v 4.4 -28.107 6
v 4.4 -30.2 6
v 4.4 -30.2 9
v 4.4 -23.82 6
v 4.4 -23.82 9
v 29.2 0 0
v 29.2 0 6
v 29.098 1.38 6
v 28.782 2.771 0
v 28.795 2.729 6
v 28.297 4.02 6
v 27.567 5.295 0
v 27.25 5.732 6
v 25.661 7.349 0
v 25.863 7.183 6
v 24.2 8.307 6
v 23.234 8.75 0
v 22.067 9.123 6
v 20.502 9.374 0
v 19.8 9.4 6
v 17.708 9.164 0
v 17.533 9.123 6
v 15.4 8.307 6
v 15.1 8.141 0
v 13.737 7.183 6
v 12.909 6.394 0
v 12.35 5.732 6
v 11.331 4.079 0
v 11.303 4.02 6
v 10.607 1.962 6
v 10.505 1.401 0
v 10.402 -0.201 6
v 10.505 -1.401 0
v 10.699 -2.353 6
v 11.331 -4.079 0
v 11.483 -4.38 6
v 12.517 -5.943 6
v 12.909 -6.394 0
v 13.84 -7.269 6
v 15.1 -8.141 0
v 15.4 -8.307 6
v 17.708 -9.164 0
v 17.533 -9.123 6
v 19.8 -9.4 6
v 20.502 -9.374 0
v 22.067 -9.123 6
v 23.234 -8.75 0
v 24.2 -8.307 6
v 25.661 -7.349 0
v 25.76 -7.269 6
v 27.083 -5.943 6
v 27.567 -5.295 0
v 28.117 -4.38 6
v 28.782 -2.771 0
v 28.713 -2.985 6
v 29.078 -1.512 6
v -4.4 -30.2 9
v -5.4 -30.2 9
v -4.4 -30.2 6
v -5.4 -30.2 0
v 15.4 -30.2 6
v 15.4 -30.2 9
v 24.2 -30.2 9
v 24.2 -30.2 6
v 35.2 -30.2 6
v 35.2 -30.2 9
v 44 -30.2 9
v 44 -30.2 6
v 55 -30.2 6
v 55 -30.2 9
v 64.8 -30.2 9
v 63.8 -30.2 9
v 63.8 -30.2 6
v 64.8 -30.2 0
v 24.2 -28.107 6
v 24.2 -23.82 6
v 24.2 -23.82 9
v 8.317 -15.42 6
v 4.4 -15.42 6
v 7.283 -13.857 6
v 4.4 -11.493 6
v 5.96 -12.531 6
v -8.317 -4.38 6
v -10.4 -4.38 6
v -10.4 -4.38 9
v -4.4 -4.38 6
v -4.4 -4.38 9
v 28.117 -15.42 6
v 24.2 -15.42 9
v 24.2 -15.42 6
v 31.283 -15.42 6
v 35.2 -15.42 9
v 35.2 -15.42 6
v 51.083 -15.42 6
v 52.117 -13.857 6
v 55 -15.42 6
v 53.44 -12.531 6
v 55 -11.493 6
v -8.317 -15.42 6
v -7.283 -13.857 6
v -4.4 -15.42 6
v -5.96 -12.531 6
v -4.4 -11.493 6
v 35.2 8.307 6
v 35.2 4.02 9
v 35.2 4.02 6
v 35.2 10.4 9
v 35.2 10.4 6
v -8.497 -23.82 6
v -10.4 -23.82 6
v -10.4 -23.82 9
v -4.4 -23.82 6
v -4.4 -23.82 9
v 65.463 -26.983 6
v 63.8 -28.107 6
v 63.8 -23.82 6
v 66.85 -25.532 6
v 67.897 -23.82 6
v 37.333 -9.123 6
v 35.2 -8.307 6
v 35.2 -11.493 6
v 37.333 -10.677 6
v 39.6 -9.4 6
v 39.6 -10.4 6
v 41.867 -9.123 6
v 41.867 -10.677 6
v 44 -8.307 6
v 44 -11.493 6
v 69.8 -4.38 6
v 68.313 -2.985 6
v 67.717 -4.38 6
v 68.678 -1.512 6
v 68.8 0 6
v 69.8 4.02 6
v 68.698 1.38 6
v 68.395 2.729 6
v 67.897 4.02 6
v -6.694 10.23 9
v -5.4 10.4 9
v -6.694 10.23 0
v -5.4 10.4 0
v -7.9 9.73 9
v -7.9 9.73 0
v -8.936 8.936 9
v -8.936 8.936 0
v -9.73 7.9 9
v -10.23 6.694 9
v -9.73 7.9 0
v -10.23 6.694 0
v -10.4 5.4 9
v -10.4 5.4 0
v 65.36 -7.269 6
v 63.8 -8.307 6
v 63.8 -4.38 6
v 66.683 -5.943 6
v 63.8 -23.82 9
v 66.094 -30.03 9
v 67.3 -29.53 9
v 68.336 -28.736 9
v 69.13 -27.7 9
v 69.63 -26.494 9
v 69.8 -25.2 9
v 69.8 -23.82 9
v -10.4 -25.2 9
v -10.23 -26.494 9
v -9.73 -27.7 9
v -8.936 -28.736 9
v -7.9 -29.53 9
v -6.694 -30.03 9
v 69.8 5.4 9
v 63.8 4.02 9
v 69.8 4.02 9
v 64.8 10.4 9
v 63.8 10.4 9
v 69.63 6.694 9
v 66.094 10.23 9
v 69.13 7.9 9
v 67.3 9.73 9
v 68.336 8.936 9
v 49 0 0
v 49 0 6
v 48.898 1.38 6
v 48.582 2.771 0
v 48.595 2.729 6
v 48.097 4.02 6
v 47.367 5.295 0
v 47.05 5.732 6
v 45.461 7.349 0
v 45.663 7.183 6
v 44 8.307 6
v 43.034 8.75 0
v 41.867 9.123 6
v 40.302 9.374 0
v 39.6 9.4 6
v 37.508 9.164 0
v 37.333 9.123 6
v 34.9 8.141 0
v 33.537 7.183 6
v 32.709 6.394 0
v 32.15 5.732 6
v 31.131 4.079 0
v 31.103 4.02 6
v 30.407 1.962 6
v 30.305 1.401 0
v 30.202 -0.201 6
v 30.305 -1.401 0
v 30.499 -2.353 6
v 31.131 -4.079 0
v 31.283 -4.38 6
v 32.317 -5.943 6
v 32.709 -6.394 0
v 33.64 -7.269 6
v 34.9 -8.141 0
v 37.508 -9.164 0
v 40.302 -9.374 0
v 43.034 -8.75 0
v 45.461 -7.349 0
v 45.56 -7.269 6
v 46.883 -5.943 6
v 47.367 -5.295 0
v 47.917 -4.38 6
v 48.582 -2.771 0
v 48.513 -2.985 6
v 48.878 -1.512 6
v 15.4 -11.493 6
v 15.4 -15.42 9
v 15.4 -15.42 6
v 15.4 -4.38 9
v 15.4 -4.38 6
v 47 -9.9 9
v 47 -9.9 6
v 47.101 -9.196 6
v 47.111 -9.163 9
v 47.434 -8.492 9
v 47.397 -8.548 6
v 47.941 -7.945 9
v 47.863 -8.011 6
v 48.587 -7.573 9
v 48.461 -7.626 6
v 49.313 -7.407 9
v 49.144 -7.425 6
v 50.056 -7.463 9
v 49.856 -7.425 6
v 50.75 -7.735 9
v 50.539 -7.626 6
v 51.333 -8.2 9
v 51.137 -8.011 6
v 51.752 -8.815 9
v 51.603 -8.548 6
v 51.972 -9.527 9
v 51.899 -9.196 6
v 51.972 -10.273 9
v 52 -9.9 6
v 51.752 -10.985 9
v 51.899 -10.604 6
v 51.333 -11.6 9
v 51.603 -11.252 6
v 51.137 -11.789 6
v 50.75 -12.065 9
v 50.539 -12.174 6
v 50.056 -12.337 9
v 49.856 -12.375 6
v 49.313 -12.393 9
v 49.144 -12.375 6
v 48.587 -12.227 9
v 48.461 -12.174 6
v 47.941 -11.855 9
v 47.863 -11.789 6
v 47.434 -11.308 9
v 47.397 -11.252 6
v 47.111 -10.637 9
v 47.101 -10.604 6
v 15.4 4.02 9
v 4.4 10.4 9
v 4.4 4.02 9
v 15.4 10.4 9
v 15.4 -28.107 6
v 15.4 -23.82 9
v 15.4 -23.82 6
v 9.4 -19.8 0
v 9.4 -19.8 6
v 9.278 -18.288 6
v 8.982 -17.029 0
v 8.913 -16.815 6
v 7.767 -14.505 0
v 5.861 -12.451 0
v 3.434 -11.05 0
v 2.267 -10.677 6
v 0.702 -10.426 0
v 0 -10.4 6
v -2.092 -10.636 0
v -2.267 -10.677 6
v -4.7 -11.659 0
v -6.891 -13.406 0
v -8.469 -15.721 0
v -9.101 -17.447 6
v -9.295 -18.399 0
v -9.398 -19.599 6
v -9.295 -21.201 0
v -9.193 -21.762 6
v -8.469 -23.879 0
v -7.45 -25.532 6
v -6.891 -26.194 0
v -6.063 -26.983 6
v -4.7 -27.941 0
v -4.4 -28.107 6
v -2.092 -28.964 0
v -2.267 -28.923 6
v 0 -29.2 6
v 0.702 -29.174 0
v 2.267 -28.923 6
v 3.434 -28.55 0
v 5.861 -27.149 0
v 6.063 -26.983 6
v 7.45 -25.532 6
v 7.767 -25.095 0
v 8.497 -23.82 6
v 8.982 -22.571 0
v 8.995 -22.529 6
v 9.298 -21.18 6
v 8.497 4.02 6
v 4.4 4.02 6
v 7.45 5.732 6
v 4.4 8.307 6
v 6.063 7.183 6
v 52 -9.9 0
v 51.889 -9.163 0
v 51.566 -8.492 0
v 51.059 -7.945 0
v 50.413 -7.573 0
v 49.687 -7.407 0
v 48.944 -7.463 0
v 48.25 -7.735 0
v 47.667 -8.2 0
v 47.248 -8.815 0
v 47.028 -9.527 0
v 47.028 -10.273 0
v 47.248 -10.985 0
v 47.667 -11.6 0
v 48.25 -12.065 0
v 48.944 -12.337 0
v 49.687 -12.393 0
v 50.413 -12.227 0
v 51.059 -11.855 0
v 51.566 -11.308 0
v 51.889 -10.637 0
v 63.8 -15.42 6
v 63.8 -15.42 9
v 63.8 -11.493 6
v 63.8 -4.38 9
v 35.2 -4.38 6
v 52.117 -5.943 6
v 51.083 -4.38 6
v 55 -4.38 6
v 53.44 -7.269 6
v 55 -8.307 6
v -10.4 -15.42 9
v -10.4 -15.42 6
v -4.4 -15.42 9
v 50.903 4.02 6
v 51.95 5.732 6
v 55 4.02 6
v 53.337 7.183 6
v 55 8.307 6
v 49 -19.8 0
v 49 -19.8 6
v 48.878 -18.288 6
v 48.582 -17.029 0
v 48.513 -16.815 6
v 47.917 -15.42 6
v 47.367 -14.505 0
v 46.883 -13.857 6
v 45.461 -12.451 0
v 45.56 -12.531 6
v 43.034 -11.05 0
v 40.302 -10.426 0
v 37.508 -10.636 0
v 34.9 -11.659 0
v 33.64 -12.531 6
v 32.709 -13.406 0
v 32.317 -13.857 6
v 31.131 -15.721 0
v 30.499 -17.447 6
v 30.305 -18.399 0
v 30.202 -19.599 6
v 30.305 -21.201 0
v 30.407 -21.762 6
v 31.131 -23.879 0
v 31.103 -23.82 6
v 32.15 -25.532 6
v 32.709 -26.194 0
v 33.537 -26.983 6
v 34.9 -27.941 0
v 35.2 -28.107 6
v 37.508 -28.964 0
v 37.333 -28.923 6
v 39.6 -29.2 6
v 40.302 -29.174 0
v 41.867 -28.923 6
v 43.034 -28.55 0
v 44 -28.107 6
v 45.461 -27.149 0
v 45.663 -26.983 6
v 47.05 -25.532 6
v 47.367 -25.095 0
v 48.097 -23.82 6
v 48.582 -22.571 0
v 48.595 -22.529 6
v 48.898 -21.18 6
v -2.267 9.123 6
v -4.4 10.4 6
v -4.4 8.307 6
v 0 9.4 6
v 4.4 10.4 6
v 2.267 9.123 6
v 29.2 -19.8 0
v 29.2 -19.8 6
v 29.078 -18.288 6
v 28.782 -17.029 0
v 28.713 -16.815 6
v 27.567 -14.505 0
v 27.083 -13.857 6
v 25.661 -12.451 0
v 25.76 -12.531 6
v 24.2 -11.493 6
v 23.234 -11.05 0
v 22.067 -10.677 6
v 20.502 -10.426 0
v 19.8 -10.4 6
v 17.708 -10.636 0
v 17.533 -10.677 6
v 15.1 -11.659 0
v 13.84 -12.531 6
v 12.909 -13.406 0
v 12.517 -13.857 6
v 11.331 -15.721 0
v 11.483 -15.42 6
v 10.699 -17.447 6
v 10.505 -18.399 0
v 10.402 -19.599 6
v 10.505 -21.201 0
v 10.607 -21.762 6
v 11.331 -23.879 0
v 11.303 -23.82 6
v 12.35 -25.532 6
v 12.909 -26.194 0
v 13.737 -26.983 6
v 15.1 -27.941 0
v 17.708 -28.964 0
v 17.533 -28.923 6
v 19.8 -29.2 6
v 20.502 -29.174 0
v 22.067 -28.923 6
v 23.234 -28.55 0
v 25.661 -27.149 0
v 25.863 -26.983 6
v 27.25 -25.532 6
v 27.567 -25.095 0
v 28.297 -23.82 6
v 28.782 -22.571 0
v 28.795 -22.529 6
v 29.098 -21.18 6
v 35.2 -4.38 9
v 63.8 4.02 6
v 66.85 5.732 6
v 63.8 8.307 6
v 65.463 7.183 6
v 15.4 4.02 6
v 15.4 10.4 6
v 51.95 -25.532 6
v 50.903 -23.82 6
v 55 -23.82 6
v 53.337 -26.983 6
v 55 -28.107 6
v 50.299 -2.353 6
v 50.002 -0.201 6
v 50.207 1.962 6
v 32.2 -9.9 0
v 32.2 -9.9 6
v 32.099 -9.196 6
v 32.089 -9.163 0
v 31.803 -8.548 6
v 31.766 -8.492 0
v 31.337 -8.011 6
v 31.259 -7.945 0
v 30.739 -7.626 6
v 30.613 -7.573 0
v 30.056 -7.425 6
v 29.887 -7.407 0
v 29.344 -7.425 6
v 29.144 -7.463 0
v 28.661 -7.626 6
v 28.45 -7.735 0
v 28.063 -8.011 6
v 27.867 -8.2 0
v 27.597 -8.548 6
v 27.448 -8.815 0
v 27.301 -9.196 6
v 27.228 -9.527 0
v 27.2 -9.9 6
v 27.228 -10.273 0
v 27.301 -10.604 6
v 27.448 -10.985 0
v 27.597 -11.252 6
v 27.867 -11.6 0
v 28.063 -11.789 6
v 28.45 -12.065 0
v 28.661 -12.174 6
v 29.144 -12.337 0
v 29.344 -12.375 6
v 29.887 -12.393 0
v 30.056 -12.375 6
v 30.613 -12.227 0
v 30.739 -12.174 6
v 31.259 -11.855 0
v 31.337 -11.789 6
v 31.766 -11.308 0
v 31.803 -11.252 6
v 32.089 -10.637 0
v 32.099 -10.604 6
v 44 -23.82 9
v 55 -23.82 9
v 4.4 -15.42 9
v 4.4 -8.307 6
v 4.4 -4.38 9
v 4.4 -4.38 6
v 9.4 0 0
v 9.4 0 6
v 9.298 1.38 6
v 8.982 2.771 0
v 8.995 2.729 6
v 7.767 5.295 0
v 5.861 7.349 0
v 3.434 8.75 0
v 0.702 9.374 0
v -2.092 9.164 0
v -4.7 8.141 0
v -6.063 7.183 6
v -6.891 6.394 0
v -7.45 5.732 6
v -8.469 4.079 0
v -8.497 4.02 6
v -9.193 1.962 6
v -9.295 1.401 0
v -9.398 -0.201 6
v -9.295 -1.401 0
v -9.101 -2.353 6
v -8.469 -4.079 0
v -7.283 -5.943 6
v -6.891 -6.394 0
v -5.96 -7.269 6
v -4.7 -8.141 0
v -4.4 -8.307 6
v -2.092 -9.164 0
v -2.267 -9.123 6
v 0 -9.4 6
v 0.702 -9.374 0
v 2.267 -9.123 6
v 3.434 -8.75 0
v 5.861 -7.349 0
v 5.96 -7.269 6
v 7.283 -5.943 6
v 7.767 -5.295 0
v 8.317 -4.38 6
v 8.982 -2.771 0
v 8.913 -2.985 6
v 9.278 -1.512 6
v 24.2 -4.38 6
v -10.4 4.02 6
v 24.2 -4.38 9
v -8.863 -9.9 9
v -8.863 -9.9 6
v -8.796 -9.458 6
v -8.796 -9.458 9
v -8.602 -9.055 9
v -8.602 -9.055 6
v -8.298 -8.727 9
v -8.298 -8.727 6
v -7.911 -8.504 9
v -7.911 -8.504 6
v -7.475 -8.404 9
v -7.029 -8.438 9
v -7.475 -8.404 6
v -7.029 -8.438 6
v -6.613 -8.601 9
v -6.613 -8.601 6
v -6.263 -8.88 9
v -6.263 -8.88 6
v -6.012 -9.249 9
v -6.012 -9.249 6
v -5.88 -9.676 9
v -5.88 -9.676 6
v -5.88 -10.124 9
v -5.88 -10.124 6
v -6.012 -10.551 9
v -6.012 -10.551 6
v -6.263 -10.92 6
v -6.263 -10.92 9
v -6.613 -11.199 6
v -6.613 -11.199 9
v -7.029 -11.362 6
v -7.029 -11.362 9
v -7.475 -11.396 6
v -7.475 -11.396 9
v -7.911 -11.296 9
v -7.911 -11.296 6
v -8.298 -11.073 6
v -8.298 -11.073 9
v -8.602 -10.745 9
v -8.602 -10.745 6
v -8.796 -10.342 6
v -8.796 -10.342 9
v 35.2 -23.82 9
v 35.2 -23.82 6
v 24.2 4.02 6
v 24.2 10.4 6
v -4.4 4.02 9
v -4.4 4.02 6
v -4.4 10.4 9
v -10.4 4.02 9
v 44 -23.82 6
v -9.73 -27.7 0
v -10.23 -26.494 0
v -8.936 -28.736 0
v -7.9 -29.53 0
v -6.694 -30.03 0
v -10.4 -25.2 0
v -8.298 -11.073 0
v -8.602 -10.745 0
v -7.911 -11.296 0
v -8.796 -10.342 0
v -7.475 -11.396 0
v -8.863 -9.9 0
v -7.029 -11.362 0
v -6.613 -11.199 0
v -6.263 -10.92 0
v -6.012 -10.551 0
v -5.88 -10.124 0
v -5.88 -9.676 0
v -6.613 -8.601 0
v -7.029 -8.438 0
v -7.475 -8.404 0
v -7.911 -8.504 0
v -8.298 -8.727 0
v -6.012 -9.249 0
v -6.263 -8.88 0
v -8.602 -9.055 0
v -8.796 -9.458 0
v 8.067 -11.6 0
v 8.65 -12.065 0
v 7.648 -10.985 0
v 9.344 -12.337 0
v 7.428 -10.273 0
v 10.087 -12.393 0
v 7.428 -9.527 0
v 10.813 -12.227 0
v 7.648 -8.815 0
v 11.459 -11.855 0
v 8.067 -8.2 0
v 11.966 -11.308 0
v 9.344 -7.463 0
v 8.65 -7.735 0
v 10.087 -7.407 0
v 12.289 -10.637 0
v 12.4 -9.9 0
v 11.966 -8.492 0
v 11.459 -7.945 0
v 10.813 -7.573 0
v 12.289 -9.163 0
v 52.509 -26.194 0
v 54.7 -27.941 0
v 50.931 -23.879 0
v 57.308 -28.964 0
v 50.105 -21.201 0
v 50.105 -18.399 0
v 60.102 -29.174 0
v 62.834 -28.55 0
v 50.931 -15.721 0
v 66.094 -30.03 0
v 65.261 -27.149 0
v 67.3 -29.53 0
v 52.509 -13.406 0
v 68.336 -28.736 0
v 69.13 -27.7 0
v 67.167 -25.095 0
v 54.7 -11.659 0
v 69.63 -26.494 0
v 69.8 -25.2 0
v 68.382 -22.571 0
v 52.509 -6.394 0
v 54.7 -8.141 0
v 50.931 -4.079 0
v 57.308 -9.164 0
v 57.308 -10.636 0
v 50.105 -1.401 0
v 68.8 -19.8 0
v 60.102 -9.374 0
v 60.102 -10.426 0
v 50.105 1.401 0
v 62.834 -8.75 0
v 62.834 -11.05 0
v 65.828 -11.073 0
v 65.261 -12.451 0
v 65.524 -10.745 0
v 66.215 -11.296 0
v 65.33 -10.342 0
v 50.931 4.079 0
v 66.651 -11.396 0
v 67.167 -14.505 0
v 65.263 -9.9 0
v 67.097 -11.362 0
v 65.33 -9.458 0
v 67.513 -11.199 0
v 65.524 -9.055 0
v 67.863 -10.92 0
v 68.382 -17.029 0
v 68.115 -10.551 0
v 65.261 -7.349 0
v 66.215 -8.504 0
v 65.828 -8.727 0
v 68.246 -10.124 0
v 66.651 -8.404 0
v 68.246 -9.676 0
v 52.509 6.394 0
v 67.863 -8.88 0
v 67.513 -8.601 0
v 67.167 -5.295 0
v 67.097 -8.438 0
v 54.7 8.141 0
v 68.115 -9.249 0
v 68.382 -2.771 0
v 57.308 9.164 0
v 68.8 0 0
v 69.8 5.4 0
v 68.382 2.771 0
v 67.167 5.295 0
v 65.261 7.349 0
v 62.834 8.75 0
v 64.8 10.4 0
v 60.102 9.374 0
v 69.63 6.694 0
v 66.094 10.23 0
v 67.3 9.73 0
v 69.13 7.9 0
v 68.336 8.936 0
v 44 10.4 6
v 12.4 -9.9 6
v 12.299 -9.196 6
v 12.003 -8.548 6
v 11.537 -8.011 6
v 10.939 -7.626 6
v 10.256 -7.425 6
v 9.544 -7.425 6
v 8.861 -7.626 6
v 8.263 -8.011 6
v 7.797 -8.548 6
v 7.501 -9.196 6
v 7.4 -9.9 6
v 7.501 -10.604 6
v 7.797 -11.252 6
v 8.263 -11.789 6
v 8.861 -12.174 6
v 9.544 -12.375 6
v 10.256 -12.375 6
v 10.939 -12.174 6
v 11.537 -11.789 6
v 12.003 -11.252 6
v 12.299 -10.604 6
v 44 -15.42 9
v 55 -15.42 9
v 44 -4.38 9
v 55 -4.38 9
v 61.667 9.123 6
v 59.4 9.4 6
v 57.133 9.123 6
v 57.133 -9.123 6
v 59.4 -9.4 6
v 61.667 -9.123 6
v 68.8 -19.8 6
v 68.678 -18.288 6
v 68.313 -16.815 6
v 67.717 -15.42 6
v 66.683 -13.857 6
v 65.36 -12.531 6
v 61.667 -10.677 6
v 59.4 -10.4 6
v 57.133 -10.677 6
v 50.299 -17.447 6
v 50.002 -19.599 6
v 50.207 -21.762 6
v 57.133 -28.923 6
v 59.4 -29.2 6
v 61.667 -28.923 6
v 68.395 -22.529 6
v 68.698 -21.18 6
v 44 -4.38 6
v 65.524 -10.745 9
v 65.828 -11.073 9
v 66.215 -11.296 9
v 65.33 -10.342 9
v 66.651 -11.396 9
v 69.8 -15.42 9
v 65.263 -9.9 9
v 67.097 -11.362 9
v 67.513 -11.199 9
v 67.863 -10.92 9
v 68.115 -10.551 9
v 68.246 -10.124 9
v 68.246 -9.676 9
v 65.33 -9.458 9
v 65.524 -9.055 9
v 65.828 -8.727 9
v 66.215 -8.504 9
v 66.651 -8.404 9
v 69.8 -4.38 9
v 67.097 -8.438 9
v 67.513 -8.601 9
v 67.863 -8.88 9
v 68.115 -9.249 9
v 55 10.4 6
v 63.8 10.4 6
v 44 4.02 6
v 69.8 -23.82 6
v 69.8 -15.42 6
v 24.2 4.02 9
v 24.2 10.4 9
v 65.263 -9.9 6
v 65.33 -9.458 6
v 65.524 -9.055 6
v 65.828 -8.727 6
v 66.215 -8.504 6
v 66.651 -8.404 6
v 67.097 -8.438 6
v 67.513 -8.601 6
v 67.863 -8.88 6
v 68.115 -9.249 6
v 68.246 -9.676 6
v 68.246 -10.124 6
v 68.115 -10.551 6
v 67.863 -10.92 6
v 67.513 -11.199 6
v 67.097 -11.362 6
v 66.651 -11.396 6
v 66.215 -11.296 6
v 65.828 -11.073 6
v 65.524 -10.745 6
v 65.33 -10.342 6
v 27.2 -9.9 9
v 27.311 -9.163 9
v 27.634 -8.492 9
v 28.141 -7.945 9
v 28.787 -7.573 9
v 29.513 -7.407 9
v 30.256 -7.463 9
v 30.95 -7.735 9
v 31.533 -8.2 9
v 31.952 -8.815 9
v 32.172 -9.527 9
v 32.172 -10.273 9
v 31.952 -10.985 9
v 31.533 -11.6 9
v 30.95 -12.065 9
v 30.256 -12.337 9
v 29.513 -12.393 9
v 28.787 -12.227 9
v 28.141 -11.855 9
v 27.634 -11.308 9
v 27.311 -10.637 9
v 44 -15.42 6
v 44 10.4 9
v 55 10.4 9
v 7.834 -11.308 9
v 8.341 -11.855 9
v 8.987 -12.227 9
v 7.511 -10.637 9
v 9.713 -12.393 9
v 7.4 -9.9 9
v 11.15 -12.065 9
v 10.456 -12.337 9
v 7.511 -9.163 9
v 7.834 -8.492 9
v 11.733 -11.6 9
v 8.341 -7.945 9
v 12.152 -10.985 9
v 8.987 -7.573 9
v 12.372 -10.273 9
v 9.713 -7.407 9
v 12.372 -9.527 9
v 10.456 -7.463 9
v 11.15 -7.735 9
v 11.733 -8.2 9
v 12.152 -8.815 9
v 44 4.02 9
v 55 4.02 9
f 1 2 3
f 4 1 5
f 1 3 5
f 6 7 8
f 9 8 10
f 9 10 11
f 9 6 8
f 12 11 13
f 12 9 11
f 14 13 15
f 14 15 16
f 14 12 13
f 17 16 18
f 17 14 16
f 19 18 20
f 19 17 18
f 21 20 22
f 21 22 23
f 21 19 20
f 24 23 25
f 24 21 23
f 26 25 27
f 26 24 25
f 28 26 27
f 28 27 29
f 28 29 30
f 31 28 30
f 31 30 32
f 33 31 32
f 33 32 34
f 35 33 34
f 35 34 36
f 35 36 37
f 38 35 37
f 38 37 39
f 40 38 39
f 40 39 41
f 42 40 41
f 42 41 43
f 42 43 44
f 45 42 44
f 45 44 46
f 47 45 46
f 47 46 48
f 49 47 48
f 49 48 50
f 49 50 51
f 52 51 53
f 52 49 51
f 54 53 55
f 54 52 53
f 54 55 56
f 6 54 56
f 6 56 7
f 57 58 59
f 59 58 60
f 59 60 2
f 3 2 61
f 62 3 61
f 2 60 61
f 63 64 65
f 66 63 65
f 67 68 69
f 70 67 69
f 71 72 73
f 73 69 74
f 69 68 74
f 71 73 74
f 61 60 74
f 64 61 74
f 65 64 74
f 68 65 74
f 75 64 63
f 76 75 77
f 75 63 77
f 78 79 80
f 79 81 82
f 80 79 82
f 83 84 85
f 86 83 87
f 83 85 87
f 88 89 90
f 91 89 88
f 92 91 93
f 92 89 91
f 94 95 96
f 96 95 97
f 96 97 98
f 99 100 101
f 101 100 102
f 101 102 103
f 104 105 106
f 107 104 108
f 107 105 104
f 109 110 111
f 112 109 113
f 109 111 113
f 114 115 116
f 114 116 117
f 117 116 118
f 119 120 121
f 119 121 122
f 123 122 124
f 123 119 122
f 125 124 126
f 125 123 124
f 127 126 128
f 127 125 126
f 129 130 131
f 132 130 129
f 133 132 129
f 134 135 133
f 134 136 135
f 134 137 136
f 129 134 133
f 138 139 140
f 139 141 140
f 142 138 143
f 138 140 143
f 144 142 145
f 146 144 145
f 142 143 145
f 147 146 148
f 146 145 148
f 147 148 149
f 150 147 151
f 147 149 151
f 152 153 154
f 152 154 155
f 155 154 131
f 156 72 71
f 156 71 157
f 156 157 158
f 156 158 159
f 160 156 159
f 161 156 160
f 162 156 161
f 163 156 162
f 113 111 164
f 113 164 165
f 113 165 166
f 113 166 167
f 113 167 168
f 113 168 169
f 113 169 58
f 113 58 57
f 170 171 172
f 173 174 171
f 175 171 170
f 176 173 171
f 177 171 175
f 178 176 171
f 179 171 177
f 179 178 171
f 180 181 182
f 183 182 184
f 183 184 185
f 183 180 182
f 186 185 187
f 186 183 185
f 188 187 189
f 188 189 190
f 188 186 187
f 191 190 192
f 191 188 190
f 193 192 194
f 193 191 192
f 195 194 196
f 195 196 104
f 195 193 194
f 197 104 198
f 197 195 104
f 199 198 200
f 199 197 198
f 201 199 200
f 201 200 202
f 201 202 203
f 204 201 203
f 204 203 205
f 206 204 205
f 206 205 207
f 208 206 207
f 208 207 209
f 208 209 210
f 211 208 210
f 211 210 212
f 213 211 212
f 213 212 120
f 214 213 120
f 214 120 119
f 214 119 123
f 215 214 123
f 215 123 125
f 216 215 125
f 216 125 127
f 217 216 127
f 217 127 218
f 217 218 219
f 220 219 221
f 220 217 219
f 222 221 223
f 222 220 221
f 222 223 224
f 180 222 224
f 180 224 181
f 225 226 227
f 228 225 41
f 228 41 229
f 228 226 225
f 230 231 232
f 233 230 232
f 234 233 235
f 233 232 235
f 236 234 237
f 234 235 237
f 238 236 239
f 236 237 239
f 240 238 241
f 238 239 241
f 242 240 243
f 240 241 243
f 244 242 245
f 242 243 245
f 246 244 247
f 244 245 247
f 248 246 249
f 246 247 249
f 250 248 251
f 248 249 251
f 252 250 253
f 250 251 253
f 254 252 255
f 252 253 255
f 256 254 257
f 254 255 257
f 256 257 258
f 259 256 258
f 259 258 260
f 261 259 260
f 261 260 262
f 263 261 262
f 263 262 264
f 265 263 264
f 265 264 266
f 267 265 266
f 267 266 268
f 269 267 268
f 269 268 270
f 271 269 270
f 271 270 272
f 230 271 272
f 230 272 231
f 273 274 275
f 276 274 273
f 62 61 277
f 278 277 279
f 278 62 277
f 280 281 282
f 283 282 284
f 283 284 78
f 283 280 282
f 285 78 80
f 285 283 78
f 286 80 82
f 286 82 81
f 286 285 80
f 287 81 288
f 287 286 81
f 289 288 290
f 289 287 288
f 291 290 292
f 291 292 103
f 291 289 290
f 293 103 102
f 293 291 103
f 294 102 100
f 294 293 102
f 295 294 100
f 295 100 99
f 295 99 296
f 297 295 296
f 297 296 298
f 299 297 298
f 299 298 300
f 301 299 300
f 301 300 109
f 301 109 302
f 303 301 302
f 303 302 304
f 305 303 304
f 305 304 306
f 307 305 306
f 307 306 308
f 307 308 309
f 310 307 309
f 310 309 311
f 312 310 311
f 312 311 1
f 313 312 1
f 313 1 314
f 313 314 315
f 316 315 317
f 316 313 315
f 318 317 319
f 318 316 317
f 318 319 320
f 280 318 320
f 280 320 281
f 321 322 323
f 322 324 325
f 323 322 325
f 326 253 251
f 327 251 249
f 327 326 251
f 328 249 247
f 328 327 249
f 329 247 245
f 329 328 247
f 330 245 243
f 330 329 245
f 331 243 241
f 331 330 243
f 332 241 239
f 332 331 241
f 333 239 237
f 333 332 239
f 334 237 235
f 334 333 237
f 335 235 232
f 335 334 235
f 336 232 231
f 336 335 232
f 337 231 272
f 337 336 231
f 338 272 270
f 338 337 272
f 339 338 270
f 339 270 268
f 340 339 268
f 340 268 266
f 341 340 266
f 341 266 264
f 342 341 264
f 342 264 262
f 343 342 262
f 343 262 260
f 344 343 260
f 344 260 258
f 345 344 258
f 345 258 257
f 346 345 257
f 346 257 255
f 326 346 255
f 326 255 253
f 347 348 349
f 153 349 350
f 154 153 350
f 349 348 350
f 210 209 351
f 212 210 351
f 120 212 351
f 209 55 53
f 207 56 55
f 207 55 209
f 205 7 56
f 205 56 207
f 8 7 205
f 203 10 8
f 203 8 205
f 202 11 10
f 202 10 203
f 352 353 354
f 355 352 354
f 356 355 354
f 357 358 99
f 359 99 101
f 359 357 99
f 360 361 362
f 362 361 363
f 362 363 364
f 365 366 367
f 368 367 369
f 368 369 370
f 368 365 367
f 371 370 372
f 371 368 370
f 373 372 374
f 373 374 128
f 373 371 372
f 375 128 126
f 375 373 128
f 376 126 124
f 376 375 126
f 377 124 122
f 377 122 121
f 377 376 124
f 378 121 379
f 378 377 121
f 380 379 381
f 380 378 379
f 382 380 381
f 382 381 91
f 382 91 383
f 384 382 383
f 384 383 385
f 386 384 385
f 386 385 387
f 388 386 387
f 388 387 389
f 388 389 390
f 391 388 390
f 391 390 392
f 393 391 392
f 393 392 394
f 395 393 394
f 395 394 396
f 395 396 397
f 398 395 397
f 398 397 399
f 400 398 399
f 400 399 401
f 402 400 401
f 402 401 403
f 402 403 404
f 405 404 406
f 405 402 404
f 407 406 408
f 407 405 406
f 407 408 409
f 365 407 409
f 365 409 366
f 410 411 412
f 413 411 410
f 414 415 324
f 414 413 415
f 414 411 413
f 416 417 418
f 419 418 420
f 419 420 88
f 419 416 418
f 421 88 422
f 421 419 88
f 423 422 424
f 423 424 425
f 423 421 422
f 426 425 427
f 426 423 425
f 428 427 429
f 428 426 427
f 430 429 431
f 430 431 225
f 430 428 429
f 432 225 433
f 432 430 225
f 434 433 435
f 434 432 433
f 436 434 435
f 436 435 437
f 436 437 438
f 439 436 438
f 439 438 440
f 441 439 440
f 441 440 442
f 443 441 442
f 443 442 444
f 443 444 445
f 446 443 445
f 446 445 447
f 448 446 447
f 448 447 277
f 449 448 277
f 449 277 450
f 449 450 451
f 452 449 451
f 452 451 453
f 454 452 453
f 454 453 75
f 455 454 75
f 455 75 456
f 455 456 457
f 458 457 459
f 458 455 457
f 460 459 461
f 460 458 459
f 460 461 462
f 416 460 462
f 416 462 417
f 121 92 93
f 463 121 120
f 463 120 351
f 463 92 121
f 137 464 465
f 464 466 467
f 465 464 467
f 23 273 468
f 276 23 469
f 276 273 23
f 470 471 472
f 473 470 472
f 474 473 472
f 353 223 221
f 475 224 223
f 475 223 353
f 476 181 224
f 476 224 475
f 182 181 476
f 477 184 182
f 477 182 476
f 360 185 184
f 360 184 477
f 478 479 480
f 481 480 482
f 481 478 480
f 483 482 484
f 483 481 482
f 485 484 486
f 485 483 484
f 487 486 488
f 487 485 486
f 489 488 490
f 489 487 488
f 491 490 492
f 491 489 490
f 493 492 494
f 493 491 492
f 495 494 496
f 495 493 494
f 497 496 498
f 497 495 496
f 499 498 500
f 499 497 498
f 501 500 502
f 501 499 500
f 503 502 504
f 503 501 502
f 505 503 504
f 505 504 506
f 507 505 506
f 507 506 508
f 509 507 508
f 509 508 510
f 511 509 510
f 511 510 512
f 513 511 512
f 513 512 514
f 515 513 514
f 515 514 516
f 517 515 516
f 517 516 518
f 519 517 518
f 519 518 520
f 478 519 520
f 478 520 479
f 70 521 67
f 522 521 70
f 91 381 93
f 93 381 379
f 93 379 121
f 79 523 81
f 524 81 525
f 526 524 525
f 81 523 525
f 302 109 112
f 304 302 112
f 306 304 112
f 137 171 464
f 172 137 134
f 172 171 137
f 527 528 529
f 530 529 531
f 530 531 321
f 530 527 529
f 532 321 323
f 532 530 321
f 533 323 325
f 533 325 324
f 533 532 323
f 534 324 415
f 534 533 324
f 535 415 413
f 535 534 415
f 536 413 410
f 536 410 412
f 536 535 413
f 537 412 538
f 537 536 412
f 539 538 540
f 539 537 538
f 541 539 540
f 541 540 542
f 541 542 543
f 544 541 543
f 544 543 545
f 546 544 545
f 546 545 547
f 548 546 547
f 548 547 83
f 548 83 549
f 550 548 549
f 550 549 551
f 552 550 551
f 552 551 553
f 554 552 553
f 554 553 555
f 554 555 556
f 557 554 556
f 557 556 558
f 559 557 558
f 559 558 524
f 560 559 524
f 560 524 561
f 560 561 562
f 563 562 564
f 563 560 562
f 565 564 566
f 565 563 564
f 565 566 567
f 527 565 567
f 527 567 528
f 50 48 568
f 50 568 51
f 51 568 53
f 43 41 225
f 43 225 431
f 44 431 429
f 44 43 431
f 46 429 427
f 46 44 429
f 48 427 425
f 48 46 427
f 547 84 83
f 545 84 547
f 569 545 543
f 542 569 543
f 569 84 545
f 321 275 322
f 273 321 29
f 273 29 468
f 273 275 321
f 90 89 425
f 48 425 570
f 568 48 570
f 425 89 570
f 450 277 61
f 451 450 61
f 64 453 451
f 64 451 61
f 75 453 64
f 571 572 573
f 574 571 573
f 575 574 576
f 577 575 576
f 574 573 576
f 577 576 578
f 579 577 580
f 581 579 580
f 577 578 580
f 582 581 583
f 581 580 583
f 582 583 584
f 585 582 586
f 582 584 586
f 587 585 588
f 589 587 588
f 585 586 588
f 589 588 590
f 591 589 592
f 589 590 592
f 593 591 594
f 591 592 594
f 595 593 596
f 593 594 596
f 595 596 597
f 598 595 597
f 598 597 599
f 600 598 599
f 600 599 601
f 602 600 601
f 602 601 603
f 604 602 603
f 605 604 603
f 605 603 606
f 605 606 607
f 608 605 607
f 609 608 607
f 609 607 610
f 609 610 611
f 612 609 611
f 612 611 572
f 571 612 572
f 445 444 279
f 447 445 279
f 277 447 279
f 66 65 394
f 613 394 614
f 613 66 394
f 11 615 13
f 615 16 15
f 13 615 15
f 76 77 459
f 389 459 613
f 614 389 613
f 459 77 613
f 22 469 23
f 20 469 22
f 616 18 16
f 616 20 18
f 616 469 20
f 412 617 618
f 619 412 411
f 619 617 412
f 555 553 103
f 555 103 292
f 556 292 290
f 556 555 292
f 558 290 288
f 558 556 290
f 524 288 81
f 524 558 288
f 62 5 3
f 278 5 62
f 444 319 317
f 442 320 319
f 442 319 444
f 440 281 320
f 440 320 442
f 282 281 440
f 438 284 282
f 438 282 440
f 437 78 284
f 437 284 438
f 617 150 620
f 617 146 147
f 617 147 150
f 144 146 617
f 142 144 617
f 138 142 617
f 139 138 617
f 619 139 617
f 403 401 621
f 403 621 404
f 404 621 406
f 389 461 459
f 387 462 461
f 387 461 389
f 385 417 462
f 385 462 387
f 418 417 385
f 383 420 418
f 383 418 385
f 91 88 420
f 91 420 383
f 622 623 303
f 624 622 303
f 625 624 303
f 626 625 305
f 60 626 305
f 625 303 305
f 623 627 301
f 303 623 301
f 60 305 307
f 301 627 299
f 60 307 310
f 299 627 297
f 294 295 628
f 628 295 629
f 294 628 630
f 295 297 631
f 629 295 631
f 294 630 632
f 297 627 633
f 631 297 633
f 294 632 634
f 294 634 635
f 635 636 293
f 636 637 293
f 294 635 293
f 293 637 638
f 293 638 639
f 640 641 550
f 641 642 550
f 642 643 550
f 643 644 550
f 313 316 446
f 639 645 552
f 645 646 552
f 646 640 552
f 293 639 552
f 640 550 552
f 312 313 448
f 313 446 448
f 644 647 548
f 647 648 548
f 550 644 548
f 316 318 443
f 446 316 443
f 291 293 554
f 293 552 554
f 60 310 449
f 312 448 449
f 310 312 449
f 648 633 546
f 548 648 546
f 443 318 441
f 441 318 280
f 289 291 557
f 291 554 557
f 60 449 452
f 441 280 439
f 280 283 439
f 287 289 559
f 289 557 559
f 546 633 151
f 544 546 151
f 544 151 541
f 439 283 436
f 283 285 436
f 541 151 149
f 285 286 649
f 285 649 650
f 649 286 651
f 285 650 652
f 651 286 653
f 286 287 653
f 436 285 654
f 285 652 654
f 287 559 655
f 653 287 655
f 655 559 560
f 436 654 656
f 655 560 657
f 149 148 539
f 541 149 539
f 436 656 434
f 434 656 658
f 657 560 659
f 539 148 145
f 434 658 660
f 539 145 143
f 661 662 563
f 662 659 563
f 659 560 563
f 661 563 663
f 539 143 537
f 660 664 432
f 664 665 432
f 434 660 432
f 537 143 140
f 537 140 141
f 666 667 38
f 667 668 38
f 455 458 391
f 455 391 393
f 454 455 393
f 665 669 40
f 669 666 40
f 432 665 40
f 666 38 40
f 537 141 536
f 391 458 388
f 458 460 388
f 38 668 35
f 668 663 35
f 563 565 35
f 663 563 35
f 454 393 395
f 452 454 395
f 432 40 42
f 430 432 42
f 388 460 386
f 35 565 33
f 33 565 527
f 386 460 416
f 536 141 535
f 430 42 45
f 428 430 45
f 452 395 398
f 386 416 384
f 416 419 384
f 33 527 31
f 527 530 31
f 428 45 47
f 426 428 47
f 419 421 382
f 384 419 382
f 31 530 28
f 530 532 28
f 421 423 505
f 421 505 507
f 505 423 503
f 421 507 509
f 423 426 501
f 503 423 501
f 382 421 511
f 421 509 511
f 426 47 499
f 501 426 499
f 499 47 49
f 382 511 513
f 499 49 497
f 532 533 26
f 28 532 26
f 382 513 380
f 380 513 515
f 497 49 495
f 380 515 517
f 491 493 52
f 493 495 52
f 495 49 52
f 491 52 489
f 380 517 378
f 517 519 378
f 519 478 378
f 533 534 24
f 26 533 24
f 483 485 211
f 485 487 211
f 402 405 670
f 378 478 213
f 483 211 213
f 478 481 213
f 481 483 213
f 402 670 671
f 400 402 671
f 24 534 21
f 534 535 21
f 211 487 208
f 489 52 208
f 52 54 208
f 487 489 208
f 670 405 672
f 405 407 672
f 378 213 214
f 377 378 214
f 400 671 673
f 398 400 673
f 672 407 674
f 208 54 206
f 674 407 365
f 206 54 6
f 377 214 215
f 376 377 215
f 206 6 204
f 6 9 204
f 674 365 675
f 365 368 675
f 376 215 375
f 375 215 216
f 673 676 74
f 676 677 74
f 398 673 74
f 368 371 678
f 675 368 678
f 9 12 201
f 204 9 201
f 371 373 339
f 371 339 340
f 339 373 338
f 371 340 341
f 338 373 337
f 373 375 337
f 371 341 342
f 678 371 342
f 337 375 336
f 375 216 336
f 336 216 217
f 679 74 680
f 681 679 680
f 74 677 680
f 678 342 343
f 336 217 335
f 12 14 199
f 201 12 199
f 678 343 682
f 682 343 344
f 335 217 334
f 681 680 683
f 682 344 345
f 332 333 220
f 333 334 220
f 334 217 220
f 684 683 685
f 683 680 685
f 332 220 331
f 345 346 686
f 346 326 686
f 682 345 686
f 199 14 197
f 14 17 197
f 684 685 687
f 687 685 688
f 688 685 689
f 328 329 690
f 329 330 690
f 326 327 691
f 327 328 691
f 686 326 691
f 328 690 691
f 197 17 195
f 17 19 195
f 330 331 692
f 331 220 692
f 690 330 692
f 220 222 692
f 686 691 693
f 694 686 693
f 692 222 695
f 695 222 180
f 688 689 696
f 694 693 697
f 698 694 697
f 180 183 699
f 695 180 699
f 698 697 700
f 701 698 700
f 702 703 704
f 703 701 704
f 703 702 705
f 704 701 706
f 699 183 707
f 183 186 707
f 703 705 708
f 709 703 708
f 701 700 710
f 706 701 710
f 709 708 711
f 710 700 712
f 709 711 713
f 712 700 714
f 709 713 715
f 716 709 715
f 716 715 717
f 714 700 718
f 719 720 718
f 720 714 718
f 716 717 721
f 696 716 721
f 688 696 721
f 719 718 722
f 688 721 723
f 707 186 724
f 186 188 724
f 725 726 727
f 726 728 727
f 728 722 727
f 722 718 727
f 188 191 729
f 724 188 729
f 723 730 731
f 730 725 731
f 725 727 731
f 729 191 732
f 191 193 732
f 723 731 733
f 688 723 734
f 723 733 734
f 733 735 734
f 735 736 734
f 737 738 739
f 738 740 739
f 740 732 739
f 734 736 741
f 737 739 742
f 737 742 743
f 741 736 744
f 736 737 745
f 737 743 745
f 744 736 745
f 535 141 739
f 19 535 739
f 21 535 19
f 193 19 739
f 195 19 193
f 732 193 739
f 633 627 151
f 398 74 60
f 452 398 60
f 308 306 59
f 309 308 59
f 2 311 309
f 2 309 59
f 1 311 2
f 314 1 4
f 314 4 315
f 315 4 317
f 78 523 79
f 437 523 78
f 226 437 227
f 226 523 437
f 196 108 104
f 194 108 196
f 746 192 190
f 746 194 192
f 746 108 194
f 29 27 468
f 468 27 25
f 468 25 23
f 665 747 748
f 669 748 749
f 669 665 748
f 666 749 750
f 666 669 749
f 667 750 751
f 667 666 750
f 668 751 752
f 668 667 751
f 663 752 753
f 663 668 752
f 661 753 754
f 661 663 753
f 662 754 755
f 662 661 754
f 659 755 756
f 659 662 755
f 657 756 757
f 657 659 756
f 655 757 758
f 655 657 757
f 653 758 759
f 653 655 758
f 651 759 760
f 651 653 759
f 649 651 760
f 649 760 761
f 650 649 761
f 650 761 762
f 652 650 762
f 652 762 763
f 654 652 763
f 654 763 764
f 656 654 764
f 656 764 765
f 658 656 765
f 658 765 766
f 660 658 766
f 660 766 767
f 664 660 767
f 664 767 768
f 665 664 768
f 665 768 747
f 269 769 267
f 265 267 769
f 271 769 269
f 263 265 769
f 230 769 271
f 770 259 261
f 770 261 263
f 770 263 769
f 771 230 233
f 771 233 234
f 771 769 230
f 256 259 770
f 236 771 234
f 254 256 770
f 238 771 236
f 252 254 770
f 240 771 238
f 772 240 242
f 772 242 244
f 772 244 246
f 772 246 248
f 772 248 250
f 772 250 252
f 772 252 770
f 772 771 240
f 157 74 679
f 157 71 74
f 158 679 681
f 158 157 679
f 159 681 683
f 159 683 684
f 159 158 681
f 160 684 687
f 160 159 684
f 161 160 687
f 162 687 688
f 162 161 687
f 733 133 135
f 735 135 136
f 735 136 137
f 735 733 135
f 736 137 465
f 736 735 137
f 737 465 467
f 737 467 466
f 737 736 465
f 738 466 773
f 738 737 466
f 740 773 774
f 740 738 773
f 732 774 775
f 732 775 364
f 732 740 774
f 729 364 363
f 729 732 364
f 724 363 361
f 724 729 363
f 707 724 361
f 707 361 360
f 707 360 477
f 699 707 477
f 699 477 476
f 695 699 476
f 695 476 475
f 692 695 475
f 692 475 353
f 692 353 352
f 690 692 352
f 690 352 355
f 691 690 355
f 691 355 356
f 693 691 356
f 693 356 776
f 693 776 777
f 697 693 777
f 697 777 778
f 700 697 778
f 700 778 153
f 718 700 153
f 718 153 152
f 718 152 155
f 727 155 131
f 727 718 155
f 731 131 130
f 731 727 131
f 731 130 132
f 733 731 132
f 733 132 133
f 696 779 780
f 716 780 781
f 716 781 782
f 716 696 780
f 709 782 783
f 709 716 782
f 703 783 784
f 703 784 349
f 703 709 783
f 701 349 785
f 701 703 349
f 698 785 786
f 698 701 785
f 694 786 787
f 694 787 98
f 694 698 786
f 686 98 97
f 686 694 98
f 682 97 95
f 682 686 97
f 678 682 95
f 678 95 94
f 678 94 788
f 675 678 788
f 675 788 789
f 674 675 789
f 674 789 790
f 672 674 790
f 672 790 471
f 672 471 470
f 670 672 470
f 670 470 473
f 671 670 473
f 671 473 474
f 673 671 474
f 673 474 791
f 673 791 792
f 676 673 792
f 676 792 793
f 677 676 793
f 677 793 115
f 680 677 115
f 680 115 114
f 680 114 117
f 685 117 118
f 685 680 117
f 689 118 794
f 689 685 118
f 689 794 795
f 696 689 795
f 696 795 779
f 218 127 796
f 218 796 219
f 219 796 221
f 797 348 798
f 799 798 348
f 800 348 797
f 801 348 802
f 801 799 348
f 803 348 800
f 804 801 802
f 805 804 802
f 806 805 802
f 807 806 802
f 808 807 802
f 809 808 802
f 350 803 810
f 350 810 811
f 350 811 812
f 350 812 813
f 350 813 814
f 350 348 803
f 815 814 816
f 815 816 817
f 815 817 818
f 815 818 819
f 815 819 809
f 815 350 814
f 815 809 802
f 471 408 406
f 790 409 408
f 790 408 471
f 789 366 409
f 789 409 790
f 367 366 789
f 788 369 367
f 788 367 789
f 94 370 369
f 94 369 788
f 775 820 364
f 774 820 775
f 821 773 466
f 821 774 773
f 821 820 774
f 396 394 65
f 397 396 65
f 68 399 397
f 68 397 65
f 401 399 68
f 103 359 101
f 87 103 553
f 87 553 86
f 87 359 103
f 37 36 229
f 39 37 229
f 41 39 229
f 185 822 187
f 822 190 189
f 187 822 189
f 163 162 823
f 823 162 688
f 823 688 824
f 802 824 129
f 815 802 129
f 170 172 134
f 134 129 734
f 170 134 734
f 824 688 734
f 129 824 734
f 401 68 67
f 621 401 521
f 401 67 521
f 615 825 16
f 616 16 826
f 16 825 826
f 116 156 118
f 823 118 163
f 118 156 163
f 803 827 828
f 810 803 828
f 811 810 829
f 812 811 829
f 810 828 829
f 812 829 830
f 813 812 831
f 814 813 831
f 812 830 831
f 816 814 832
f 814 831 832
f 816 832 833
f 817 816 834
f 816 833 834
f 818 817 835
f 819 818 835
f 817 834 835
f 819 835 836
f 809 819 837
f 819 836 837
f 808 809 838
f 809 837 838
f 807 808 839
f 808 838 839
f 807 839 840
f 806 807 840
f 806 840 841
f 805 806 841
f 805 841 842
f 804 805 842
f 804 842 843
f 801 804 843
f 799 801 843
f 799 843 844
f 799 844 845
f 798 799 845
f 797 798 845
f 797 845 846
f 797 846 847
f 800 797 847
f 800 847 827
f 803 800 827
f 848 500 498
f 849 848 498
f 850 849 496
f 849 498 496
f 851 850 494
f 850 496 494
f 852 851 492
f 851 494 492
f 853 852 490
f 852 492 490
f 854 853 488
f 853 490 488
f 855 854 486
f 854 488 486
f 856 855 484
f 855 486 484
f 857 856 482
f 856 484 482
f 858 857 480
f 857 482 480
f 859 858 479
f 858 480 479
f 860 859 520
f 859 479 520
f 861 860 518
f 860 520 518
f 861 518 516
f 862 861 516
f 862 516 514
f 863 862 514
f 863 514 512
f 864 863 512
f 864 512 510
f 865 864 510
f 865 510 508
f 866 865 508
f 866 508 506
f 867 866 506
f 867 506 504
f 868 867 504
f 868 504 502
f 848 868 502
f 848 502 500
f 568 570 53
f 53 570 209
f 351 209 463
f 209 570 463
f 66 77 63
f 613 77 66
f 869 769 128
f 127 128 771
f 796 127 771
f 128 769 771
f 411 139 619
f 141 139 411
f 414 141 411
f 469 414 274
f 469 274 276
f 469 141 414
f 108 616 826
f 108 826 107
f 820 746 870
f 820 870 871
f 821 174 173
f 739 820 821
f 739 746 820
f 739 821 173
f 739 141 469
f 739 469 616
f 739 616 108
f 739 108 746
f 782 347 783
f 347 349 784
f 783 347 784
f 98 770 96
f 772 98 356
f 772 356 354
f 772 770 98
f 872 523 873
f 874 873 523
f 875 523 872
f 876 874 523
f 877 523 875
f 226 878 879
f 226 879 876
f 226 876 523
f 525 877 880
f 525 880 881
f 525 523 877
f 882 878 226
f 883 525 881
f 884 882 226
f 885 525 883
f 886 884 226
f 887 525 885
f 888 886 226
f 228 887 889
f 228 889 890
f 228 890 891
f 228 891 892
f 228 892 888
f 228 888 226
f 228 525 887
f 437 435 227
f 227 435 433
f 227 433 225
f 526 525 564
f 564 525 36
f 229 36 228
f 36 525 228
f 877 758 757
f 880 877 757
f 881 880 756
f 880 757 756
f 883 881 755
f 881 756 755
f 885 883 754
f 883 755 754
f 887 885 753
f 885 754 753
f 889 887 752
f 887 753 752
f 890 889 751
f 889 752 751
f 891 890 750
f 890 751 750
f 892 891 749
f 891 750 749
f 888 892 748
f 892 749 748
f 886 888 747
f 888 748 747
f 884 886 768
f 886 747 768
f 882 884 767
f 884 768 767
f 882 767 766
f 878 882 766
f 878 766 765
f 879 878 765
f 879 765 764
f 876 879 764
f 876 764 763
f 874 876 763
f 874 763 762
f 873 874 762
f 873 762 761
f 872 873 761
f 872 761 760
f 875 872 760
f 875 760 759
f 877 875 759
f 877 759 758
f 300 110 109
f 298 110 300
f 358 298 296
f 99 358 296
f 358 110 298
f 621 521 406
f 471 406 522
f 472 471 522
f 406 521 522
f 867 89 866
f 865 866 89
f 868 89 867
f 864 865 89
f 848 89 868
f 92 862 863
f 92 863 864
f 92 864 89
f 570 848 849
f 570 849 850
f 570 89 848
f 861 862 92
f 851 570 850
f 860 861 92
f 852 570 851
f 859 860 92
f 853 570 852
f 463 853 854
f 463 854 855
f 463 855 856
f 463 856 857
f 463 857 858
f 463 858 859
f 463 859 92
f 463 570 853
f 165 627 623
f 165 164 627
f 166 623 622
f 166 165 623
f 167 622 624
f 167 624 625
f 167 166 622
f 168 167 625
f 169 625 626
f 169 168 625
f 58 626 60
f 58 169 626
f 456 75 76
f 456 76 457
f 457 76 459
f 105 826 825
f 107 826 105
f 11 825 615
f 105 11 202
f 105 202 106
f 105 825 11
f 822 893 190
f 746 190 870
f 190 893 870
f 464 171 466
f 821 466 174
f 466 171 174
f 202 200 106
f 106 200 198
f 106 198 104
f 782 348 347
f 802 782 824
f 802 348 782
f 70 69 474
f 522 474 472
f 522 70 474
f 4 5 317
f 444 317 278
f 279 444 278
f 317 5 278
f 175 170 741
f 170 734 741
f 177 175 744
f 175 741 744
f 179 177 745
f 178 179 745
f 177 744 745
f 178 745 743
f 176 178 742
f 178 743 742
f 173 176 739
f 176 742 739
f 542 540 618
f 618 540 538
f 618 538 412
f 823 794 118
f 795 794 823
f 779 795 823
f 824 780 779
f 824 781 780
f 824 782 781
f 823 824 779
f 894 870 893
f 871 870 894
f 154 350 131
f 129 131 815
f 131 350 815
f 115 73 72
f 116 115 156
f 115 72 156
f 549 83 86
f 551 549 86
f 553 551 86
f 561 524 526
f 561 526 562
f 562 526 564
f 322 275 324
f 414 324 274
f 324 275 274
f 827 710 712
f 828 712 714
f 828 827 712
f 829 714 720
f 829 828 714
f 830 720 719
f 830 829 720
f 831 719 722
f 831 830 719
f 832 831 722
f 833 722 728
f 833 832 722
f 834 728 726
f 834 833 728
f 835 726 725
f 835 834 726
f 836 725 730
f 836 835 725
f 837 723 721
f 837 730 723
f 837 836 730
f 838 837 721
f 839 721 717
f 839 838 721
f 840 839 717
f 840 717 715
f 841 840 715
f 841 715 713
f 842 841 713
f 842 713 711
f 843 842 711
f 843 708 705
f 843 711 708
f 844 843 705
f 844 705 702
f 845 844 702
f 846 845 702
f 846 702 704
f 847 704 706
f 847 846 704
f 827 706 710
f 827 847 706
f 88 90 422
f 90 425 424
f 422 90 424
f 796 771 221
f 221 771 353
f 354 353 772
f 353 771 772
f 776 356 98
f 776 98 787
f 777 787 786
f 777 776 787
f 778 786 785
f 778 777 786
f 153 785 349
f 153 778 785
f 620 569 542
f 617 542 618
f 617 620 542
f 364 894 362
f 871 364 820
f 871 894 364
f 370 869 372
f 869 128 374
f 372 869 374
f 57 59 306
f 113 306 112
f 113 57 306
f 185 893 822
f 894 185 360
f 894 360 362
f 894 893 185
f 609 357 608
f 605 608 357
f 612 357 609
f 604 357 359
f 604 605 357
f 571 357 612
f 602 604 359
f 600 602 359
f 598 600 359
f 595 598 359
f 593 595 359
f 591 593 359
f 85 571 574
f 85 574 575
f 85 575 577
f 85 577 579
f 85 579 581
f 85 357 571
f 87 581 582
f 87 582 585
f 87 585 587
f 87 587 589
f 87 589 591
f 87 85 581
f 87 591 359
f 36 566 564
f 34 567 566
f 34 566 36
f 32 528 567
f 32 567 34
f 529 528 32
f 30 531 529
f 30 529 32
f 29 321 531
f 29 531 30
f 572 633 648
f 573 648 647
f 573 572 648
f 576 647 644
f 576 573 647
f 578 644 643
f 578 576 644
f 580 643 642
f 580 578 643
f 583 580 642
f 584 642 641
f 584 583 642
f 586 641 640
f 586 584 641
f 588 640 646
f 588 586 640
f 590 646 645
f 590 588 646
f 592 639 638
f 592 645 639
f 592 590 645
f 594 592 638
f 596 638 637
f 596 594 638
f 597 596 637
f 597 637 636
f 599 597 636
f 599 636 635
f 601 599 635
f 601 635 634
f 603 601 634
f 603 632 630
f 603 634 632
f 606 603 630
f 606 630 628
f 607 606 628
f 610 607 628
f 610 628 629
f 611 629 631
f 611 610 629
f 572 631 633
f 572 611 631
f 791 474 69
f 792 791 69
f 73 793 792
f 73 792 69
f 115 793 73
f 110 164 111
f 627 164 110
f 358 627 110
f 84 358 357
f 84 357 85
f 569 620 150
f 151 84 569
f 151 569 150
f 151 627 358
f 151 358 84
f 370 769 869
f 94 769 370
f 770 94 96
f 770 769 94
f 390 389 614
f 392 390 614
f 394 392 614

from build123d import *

# Parameters (mm, degrees)
SKETCH_1_W               = 80.2
SKETCH_1_H               = 40.6
SKETCH_1_R               = 9.4
SKETCH_1_R_2             = 2.5
EXTRUDE_1_DEPTH          = 6
SKETCH_2_W               = 80.2
SKETCH_2_H               = 40.6
EXTRUDE_2_DEPTH          = 3
SKETCH_3_W               = 80.2
SKETCH_3_H               = 8.4
CUT_EXTRUDE_1_DEPTH      = 3
SKETCH_4_W               = 8.8
SKETCH_4_H               = 40.6
CUT_EXTRUDE_2_DEPTH      = 3
SKETCH_5_R               = 2.5
SKETCH_5_R_2             = 1.5
CUT_EXTRUDE_3_DEPTH      = 7
CUT_EXTRUDE_3_DEPTH_BACK = 10
FILLET_3_R               = 5
FILLET_8_R               = 5
FILLET_9_R               = 5
FILLET_10_R              = 5


with BuildPart() as part:
    # 草图1 → 凸台-拉伸1 (new body)
    with BuildSketch(Plane.XY):
        with Locations((29.7, -9.9)):
            Rectangle(SKETCH_1_W, SKETCH_1_H)
        Circle(SKETCH_1_R, mode=Mode.SUBTRACT)
        with Locations((19.8, 0)):
            Circle(SKETCH_1_R, mode=Mode.SUBTRACT)
        with Locations((39.6, 0)):
            Circle(SKETCH_1_R, mode=Mode.SUBTRACT)
        with Locations((59.4, 0)):
            Circle(SKETCH_1_R, mode=Mode.SUBTRACT)
        with Locations((0, -19.8)):
            Circle(SKETCH_1_R, mode=Mode.SUBTRACT)
        with Locations((19.8, -19.8)):
            Circle(SKETCH_1_R, mode=Mode.SUBTRACT)
        with Locations((39.6, -19.8)):
            Circle(SKETCH_1_R, mode=Mode.SUBTRACT)
        with Locations((59.4, -19.8)):
            Circle(SKETCH_1_R, mode=Mode.SUBTRACT)
        with Locations((9.9, -9.9)):
            Circle(SKETCH_1_R_2, mode=Mode.SUBTRACT)
        with Locations((29.7, -9.9)):
            Circle(SKETCH_1_R_2, mode=Mode.SUBTRACT)
        with Locations((49.5, -9.9)):
            Circle(SKETCH_1_R_2, mode=Mode.SUBTRACT)
    extrude(amount=EXTRUDE_1_DEPTH)

    # 草图2 → 凸台-拉伸2 (add)
    with BuildSketch(Plane.XY.offset(6)):
        with Locations((29.7, -9.9)):
            Rectangle(SKETCH_2_W, SKETCH_2_H)
    extrude(amount=EXTRUDE_2_DEPTH)

    # 草图3 → 切除-拉伸1 (cut)
    with BuildSketch(Plane.XY.offset(9)):
        with Locations((29.7, -0.18)):
            Rectangle(SKETCH_3_W, SKETCH_3_H)
        with Locations((29.7, -19.62)):
            Rectangle(SKETCH_3_W, SKETCH_3_H)
    extrude(amount=-CUT_EXTRUDE_1_DEPTH, mode=Mode.SUBTRACT)

    # 草图4 → 切除-拉伸2 (cut)
    with BuildSketch(Plane.XY.offset(9)):
        with Locations((0, -9.9)):
            Rectangle(SKETCH_4_W, SKETCH_4_H)
        with Locations((19.8, -9.9)):
            Rectangle(SKETCH_4_W, SKETCH_4_H)
        with Locations((39.6, -9.9)):
            Rectangle(SKETCH_4_W, SKETCH_4_H)
        with Locations((59.4, -9.9)):
            Rectangle(SKETCH_4_W, SKETCH_4_H)
    extrude(amount=-CUT_EXTRUDE_2_DEPTH, mode=Mode.SUBTRACT)

    # 草图5 → 切除-拉伸3 (cut, two sides)
    with BuildSketch(Plane(origin=(0, 0, 6), x_dir=(-1, 0, 0), z_dir=(0, 0, -1))) as cut_extrude_3_sk:
        with Locations((-49.5, -9.9)):
            Circle(SKETCH_5_R)
        with Locations((-29.7, -9.9)):
            Circle(SKETCH_5_R)
        with Locations((-9.9, -9.9)):
            Circle(SKETCH_5_R)
        with Locations((-66.76305517, -9.9)):
            Circle(SKETCH_5_R_2)
        with Locations((7.36305517, -9.9)):
            Circle(SKETCH_5_R_2)
    extrude(amount=CUT_EXTRUDE_3_DEPTH, mode=Mode.SUBTRACT)
    extrude(cut_extrude_3_sk.sketch, amount=-CUT_EXTRUDE_3_DEPTH_BACK, mode=Mode.SUBTRACT)

    # 圆角3
    fillet_3_edges = [part.edges().sort_by_distance(p)[0] for p in [
        (-10.4, -30.2, 4.5),
    ]]
    fillet(fillet_3_edges, radius=FILLET_3_R)

    # 圆角8
    fillet_8_edges = [part.edges().sort_by_distance(p)[0] for p in [
        (69.8, -30.2, 4.5),
    ]]
    fillet(fillet_8_edges, radius=FILLET_8_R)

    # 圆角9
    fillet_9_edges = [part.edges().sort_by_distance(p)[0] for p in [
        (69.8, 10.4, 4.5),
    ]]
    fillet(fillet_9_edges, radius=FILLET_9_R)

    # 圆角10
    fillet_10_edges = [part.edges().sort_by_distance(p)[0] for p in [
        (-10.4, 10.4, 4.5),
    ]]
    fillet(fillet_10_edges, radius=FILLET_10_R)


solid = part.part
